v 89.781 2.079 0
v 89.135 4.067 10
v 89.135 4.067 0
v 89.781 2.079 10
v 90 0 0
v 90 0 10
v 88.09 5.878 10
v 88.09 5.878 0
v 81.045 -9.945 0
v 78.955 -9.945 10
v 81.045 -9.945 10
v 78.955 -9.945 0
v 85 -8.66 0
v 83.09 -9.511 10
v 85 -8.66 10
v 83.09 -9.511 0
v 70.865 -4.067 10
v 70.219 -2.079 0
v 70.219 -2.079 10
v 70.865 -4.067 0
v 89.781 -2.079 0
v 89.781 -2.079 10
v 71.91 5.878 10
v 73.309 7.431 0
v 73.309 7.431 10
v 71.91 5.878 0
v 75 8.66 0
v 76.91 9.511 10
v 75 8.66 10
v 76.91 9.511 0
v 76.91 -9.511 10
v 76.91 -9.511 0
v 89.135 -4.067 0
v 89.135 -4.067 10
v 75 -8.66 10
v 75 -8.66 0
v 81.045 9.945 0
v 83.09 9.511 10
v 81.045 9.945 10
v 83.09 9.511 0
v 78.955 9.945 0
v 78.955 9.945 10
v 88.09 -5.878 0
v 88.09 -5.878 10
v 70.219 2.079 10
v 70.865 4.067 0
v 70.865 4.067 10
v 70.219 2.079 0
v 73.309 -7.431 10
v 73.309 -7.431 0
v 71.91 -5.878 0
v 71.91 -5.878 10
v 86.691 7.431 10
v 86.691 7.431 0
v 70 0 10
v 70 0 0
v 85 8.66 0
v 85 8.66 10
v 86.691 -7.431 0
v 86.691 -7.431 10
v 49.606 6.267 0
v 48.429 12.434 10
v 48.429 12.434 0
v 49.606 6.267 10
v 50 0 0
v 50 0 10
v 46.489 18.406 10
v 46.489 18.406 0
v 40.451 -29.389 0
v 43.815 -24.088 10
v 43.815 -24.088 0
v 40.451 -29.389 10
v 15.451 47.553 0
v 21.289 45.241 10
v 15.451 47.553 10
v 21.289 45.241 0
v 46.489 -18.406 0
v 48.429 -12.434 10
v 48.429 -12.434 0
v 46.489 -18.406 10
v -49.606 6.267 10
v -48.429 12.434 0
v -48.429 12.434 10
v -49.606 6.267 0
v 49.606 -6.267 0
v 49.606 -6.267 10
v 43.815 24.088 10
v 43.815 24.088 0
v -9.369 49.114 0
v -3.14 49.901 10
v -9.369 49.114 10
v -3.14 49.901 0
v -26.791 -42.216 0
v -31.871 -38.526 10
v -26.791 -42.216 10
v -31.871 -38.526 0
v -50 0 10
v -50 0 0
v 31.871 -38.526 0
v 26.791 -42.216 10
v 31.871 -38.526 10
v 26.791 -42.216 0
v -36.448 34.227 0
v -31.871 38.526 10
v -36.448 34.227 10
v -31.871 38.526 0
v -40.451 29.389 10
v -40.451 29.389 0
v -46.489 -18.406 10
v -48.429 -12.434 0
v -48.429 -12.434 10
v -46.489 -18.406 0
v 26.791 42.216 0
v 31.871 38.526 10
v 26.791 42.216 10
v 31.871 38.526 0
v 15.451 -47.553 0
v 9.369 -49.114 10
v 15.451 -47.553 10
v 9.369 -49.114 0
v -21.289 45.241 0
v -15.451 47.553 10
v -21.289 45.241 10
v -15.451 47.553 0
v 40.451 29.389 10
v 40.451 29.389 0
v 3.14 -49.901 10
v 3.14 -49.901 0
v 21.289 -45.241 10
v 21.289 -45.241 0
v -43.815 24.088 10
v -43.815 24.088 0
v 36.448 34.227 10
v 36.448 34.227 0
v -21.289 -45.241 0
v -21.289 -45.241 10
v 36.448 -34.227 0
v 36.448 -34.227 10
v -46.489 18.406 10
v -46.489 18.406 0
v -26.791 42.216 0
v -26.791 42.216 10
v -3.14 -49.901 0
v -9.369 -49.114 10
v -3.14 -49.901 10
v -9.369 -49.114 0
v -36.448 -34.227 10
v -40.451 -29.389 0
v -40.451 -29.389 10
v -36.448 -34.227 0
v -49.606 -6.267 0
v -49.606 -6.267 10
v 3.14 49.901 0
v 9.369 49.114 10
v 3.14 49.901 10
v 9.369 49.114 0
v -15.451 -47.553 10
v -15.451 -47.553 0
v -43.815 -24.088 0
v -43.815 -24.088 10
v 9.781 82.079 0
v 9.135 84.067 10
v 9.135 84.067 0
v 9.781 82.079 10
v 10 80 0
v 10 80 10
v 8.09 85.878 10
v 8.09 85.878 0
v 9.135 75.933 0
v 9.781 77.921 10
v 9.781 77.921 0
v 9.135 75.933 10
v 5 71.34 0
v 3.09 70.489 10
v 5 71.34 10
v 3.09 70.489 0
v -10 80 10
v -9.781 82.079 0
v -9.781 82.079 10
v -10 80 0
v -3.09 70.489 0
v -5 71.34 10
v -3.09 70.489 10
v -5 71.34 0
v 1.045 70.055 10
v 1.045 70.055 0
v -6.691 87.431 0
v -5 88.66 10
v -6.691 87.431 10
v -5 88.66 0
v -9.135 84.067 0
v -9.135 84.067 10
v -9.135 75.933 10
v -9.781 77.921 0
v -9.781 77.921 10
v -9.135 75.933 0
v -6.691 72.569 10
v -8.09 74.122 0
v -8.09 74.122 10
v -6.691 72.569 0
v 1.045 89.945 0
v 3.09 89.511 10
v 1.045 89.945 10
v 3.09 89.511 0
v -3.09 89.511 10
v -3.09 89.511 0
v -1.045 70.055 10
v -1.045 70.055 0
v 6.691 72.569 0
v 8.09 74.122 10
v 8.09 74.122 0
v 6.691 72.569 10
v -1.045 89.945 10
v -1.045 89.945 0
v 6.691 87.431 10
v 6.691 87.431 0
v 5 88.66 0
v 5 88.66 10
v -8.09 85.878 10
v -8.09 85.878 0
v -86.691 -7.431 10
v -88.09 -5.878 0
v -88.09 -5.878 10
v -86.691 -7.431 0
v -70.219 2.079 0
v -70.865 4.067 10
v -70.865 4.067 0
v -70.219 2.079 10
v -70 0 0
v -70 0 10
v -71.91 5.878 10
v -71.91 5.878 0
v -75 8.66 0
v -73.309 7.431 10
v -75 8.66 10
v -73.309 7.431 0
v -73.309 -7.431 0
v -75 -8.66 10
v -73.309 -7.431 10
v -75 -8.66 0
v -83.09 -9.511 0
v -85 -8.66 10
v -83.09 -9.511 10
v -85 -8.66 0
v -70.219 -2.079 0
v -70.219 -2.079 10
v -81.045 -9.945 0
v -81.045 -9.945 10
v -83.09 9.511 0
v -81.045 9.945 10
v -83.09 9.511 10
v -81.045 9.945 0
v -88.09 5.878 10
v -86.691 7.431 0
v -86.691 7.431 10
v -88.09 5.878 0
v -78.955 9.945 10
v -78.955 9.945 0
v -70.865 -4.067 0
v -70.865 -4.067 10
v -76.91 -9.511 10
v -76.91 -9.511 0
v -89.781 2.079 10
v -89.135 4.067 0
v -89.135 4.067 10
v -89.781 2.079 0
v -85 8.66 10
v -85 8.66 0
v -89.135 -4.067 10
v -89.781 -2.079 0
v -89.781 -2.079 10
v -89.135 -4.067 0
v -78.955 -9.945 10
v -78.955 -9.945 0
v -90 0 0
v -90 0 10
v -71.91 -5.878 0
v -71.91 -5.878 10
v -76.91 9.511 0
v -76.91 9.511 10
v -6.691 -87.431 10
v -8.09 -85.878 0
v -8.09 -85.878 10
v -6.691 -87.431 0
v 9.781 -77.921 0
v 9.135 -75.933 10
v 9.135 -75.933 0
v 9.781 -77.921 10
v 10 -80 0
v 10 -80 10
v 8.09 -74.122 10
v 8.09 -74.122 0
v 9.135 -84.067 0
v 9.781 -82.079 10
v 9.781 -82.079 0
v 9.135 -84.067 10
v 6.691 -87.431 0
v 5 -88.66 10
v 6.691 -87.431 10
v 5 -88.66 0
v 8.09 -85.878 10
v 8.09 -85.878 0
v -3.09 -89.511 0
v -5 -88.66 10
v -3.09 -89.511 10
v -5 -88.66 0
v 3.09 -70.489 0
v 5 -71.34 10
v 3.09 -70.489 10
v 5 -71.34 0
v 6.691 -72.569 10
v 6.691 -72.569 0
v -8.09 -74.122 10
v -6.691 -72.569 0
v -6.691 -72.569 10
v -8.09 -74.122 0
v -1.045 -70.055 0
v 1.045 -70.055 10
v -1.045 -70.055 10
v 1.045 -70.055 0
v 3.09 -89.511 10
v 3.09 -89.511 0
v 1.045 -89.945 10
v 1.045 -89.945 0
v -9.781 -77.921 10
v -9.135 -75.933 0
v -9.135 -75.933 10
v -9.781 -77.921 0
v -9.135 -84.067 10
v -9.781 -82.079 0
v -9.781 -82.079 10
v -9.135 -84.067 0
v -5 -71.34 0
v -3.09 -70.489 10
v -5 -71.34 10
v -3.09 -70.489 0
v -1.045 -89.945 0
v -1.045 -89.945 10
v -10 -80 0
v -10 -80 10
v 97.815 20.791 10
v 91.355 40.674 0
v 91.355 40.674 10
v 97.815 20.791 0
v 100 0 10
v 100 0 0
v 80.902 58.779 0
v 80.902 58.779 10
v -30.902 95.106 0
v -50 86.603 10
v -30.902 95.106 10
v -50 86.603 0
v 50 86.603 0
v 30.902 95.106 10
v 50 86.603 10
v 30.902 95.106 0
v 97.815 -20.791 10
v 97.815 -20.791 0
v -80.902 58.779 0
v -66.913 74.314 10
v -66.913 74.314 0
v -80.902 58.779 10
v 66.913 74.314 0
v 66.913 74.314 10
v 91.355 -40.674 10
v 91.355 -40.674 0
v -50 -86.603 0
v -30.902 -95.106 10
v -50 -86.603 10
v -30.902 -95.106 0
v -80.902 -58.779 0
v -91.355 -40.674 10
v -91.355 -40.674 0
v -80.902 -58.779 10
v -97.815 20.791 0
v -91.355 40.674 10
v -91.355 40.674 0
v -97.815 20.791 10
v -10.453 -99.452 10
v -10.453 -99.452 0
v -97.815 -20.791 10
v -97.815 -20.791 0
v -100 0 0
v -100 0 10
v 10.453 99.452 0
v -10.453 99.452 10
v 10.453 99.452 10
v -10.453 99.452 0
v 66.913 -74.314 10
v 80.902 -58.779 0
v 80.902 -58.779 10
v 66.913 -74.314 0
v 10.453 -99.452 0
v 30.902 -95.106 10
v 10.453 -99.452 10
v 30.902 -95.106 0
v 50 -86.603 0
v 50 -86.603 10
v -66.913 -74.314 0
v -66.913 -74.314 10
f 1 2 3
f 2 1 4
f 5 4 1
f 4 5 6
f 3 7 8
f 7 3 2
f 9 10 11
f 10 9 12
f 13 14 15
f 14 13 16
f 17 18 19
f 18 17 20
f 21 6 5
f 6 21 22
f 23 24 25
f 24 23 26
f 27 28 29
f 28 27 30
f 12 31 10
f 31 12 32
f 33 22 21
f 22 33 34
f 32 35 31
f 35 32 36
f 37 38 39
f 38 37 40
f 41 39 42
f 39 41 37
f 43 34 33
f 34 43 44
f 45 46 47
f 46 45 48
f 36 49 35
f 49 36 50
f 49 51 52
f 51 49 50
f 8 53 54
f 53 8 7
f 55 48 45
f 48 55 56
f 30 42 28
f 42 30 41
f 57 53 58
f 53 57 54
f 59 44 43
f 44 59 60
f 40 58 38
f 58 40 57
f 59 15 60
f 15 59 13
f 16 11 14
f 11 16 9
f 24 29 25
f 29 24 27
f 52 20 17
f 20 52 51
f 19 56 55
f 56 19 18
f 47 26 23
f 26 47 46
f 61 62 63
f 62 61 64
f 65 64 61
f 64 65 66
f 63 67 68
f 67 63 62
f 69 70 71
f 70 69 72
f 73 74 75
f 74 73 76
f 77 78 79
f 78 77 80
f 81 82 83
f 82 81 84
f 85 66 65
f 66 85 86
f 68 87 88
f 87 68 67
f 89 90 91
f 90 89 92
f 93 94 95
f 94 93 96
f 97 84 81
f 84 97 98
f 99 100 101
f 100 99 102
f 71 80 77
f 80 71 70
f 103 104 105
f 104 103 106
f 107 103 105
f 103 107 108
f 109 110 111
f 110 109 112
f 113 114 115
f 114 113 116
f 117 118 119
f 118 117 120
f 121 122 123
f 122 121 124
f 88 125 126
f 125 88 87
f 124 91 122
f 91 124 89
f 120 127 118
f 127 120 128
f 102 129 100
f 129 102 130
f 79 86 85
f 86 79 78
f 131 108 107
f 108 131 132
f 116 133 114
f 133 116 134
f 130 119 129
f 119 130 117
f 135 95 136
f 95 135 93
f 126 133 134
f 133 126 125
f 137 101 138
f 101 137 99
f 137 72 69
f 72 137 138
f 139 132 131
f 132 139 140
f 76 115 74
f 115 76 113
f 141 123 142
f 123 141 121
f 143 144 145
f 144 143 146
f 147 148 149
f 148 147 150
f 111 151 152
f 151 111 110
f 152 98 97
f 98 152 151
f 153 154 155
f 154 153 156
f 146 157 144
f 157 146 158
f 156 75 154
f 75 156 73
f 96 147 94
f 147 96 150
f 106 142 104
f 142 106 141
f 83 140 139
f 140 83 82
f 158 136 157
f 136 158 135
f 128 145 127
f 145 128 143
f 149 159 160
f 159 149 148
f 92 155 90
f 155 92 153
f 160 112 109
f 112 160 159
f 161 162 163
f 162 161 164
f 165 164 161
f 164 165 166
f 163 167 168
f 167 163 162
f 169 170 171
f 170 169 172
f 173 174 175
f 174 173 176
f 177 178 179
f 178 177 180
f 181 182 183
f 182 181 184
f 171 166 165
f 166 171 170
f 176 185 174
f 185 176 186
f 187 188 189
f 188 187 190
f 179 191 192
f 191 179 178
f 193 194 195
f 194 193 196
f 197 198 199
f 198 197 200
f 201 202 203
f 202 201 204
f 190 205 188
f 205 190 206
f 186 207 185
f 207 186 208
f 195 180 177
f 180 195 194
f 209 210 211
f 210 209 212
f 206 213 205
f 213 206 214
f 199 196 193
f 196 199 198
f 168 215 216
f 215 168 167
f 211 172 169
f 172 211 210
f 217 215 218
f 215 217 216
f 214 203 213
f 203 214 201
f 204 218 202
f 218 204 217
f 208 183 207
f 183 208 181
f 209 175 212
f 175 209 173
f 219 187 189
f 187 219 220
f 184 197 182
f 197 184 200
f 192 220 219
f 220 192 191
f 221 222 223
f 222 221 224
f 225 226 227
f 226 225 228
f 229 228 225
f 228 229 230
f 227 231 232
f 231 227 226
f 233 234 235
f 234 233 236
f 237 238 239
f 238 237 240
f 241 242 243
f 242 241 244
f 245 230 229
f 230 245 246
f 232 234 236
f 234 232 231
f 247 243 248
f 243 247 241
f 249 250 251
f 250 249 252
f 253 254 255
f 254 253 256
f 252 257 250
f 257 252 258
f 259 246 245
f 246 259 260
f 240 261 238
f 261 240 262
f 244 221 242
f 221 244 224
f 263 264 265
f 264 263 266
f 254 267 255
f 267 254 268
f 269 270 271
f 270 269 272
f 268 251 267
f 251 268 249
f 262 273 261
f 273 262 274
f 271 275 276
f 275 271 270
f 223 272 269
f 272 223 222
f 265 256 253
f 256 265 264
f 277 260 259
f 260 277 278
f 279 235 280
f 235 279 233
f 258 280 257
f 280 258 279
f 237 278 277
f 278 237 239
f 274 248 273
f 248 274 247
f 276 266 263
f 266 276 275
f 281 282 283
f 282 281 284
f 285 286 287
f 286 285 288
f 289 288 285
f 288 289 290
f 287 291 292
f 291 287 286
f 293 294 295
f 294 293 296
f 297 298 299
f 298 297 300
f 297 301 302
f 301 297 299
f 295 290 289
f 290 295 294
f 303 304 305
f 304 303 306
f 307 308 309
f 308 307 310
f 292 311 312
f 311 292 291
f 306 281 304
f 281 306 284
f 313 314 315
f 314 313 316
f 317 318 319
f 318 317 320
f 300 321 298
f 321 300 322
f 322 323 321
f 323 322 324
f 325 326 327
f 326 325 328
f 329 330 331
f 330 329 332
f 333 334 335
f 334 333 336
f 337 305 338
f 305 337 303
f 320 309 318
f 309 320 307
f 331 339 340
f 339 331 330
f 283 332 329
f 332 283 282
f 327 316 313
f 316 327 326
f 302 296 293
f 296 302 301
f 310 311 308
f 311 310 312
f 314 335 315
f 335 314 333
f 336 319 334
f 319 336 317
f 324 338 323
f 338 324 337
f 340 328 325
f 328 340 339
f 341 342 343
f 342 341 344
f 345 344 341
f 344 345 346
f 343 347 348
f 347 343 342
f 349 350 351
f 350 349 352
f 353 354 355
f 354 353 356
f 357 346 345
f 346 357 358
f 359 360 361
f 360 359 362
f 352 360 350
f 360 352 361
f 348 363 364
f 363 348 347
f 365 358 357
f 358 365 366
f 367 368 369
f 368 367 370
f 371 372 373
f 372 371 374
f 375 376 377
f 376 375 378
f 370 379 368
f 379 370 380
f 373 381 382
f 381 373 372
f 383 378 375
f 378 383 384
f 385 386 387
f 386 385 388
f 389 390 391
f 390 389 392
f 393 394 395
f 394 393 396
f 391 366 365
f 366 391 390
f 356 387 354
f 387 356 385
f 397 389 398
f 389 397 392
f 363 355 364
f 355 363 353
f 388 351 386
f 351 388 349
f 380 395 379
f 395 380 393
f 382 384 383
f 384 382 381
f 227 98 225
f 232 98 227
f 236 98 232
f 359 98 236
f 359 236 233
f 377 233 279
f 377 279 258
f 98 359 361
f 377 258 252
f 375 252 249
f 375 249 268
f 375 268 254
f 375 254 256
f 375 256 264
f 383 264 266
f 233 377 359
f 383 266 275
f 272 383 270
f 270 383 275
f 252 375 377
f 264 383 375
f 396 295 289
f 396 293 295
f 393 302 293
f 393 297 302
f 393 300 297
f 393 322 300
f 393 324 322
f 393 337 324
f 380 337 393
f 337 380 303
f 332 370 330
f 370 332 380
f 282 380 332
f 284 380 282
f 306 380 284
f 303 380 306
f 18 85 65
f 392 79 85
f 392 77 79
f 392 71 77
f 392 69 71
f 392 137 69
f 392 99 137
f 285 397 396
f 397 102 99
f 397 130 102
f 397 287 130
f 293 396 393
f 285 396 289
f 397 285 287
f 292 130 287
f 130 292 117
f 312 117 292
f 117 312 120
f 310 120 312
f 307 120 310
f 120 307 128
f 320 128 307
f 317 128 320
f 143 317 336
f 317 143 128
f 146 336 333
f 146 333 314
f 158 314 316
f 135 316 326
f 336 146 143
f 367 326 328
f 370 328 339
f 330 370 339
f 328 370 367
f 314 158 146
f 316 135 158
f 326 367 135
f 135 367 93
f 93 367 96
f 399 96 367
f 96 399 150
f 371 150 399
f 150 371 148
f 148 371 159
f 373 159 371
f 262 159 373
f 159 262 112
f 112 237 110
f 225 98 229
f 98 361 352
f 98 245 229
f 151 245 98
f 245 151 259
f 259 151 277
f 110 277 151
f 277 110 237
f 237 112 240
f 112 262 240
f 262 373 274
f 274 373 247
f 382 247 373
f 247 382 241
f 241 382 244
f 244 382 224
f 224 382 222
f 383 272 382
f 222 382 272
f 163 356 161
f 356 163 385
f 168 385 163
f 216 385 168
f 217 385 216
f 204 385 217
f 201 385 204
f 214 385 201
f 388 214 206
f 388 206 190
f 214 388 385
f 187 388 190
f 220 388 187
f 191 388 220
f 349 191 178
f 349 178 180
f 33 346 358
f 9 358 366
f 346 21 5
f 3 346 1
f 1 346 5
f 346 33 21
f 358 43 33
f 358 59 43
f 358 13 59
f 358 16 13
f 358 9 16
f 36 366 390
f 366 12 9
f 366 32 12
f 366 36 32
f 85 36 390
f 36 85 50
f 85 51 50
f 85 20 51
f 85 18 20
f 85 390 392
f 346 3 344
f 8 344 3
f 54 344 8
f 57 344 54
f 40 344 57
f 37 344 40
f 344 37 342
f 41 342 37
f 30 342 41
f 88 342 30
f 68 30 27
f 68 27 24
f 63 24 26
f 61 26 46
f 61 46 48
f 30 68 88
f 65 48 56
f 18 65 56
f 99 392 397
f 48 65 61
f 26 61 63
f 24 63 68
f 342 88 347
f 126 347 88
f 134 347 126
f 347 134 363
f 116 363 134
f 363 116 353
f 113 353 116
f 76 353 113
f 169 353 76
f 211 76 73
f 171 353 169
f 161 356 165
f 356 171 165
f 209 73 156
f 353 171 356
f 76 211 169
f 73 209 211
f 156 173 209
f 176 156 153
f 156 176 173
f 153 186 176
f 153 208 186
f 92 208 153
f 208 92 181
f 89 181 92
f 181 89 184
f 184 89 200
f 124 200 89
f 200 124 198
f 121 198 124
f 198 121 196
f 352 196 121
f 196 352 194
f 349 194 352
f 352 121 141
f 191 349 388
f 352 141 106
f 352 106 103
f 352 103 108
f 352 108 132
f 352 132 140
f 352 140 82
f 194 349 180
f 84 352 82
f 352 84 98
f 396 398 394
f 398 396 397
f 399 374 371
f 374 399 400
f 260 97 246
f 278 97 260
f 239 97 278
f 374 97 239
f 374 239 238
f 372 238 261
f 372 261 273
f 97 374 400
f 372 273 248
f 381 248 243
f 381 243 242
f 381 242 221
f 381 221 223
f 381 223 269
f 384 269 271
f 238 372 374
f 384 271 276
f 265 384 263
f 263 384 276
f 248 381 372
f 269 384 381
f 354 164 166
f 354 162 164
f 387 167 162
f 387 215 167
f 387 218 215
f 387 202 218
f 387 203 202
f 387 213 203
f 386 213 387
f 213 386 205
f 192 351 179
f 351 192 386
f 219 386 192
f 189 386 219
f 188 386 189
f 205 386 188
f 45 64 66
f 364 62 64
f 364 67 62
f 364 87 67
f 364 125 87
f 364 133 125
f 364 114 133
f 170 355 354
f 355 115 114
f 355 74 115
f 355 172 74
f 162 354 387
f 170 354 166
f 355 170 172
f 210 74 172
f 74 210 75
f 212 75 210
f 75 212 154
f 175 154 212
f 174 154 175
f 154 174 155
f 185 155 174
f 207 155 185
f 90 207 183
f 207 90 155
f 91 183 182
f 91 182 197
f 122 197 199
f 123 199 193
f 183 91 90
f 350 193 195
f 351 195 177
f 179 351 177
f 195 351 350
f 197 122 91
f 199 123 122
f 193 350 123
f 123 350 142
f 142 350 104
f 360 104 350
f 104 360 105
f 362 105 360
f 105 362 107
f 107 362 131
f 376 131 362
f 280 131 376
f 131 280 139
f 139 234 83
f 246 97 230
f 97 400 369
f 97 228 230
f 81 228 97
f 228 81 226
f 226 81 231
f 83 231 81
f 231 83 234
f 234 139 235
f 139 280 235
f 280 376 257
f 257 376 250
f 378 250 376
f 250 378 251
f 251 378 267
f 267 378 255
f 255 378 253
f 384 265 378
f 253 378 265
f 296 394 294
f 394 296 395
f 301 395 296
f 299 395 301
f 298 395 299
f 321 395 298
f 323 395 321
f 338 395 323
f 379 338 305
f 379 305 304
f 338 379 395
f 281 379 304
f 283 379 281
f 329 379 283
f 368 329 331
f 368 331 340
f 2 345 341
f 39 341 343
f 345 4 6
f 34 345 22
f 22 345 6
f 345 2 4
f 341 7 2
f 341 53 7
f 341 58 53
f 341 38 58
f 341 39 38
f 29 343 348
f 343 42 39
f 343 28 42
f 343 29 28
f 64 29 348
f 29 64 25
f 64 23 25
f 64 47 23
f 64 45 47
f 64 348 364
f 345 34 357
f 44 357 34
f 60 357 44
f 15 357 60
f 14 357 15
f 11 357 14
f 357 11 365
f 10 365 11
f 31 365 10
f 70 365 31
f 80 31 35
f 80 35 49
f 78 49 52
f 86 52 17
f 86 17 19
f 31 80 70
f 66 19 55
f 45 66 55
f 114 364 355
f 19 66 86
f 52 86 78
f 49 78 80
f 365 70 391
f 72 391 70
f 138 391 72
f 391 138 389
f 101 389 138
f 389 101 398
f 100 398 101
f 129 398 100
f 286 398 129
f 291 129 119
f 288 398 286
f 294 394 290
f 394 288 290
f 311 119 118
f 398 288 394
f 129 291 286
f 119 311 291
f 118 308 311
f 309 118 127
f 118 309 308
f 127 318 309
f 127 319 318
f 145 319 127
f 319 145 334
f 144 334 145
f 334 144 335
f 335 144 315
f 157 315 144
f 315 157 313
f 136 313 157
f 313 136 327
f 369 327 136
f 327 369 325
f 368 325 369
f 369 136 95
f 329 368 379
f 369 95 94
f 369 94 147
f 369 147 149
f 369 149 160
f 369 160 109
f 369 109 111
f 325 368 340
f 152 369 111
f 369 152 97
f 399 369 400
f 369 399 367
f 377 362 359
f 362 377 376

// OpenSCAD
module Flange(){
color("#c0c6c7")
difference(){
cylinder(10,100,100,$fn=30);

r = 80;
for (i=[0:90:359]) {
    translate([r*cos(i),r*sin(i),-1])
        cylinder(12,10,10,$fn=30);
 
 translate([0,0,-1]) 
 cylinder(12,50,50,$fn=50);   
}

}

}

Flange();
